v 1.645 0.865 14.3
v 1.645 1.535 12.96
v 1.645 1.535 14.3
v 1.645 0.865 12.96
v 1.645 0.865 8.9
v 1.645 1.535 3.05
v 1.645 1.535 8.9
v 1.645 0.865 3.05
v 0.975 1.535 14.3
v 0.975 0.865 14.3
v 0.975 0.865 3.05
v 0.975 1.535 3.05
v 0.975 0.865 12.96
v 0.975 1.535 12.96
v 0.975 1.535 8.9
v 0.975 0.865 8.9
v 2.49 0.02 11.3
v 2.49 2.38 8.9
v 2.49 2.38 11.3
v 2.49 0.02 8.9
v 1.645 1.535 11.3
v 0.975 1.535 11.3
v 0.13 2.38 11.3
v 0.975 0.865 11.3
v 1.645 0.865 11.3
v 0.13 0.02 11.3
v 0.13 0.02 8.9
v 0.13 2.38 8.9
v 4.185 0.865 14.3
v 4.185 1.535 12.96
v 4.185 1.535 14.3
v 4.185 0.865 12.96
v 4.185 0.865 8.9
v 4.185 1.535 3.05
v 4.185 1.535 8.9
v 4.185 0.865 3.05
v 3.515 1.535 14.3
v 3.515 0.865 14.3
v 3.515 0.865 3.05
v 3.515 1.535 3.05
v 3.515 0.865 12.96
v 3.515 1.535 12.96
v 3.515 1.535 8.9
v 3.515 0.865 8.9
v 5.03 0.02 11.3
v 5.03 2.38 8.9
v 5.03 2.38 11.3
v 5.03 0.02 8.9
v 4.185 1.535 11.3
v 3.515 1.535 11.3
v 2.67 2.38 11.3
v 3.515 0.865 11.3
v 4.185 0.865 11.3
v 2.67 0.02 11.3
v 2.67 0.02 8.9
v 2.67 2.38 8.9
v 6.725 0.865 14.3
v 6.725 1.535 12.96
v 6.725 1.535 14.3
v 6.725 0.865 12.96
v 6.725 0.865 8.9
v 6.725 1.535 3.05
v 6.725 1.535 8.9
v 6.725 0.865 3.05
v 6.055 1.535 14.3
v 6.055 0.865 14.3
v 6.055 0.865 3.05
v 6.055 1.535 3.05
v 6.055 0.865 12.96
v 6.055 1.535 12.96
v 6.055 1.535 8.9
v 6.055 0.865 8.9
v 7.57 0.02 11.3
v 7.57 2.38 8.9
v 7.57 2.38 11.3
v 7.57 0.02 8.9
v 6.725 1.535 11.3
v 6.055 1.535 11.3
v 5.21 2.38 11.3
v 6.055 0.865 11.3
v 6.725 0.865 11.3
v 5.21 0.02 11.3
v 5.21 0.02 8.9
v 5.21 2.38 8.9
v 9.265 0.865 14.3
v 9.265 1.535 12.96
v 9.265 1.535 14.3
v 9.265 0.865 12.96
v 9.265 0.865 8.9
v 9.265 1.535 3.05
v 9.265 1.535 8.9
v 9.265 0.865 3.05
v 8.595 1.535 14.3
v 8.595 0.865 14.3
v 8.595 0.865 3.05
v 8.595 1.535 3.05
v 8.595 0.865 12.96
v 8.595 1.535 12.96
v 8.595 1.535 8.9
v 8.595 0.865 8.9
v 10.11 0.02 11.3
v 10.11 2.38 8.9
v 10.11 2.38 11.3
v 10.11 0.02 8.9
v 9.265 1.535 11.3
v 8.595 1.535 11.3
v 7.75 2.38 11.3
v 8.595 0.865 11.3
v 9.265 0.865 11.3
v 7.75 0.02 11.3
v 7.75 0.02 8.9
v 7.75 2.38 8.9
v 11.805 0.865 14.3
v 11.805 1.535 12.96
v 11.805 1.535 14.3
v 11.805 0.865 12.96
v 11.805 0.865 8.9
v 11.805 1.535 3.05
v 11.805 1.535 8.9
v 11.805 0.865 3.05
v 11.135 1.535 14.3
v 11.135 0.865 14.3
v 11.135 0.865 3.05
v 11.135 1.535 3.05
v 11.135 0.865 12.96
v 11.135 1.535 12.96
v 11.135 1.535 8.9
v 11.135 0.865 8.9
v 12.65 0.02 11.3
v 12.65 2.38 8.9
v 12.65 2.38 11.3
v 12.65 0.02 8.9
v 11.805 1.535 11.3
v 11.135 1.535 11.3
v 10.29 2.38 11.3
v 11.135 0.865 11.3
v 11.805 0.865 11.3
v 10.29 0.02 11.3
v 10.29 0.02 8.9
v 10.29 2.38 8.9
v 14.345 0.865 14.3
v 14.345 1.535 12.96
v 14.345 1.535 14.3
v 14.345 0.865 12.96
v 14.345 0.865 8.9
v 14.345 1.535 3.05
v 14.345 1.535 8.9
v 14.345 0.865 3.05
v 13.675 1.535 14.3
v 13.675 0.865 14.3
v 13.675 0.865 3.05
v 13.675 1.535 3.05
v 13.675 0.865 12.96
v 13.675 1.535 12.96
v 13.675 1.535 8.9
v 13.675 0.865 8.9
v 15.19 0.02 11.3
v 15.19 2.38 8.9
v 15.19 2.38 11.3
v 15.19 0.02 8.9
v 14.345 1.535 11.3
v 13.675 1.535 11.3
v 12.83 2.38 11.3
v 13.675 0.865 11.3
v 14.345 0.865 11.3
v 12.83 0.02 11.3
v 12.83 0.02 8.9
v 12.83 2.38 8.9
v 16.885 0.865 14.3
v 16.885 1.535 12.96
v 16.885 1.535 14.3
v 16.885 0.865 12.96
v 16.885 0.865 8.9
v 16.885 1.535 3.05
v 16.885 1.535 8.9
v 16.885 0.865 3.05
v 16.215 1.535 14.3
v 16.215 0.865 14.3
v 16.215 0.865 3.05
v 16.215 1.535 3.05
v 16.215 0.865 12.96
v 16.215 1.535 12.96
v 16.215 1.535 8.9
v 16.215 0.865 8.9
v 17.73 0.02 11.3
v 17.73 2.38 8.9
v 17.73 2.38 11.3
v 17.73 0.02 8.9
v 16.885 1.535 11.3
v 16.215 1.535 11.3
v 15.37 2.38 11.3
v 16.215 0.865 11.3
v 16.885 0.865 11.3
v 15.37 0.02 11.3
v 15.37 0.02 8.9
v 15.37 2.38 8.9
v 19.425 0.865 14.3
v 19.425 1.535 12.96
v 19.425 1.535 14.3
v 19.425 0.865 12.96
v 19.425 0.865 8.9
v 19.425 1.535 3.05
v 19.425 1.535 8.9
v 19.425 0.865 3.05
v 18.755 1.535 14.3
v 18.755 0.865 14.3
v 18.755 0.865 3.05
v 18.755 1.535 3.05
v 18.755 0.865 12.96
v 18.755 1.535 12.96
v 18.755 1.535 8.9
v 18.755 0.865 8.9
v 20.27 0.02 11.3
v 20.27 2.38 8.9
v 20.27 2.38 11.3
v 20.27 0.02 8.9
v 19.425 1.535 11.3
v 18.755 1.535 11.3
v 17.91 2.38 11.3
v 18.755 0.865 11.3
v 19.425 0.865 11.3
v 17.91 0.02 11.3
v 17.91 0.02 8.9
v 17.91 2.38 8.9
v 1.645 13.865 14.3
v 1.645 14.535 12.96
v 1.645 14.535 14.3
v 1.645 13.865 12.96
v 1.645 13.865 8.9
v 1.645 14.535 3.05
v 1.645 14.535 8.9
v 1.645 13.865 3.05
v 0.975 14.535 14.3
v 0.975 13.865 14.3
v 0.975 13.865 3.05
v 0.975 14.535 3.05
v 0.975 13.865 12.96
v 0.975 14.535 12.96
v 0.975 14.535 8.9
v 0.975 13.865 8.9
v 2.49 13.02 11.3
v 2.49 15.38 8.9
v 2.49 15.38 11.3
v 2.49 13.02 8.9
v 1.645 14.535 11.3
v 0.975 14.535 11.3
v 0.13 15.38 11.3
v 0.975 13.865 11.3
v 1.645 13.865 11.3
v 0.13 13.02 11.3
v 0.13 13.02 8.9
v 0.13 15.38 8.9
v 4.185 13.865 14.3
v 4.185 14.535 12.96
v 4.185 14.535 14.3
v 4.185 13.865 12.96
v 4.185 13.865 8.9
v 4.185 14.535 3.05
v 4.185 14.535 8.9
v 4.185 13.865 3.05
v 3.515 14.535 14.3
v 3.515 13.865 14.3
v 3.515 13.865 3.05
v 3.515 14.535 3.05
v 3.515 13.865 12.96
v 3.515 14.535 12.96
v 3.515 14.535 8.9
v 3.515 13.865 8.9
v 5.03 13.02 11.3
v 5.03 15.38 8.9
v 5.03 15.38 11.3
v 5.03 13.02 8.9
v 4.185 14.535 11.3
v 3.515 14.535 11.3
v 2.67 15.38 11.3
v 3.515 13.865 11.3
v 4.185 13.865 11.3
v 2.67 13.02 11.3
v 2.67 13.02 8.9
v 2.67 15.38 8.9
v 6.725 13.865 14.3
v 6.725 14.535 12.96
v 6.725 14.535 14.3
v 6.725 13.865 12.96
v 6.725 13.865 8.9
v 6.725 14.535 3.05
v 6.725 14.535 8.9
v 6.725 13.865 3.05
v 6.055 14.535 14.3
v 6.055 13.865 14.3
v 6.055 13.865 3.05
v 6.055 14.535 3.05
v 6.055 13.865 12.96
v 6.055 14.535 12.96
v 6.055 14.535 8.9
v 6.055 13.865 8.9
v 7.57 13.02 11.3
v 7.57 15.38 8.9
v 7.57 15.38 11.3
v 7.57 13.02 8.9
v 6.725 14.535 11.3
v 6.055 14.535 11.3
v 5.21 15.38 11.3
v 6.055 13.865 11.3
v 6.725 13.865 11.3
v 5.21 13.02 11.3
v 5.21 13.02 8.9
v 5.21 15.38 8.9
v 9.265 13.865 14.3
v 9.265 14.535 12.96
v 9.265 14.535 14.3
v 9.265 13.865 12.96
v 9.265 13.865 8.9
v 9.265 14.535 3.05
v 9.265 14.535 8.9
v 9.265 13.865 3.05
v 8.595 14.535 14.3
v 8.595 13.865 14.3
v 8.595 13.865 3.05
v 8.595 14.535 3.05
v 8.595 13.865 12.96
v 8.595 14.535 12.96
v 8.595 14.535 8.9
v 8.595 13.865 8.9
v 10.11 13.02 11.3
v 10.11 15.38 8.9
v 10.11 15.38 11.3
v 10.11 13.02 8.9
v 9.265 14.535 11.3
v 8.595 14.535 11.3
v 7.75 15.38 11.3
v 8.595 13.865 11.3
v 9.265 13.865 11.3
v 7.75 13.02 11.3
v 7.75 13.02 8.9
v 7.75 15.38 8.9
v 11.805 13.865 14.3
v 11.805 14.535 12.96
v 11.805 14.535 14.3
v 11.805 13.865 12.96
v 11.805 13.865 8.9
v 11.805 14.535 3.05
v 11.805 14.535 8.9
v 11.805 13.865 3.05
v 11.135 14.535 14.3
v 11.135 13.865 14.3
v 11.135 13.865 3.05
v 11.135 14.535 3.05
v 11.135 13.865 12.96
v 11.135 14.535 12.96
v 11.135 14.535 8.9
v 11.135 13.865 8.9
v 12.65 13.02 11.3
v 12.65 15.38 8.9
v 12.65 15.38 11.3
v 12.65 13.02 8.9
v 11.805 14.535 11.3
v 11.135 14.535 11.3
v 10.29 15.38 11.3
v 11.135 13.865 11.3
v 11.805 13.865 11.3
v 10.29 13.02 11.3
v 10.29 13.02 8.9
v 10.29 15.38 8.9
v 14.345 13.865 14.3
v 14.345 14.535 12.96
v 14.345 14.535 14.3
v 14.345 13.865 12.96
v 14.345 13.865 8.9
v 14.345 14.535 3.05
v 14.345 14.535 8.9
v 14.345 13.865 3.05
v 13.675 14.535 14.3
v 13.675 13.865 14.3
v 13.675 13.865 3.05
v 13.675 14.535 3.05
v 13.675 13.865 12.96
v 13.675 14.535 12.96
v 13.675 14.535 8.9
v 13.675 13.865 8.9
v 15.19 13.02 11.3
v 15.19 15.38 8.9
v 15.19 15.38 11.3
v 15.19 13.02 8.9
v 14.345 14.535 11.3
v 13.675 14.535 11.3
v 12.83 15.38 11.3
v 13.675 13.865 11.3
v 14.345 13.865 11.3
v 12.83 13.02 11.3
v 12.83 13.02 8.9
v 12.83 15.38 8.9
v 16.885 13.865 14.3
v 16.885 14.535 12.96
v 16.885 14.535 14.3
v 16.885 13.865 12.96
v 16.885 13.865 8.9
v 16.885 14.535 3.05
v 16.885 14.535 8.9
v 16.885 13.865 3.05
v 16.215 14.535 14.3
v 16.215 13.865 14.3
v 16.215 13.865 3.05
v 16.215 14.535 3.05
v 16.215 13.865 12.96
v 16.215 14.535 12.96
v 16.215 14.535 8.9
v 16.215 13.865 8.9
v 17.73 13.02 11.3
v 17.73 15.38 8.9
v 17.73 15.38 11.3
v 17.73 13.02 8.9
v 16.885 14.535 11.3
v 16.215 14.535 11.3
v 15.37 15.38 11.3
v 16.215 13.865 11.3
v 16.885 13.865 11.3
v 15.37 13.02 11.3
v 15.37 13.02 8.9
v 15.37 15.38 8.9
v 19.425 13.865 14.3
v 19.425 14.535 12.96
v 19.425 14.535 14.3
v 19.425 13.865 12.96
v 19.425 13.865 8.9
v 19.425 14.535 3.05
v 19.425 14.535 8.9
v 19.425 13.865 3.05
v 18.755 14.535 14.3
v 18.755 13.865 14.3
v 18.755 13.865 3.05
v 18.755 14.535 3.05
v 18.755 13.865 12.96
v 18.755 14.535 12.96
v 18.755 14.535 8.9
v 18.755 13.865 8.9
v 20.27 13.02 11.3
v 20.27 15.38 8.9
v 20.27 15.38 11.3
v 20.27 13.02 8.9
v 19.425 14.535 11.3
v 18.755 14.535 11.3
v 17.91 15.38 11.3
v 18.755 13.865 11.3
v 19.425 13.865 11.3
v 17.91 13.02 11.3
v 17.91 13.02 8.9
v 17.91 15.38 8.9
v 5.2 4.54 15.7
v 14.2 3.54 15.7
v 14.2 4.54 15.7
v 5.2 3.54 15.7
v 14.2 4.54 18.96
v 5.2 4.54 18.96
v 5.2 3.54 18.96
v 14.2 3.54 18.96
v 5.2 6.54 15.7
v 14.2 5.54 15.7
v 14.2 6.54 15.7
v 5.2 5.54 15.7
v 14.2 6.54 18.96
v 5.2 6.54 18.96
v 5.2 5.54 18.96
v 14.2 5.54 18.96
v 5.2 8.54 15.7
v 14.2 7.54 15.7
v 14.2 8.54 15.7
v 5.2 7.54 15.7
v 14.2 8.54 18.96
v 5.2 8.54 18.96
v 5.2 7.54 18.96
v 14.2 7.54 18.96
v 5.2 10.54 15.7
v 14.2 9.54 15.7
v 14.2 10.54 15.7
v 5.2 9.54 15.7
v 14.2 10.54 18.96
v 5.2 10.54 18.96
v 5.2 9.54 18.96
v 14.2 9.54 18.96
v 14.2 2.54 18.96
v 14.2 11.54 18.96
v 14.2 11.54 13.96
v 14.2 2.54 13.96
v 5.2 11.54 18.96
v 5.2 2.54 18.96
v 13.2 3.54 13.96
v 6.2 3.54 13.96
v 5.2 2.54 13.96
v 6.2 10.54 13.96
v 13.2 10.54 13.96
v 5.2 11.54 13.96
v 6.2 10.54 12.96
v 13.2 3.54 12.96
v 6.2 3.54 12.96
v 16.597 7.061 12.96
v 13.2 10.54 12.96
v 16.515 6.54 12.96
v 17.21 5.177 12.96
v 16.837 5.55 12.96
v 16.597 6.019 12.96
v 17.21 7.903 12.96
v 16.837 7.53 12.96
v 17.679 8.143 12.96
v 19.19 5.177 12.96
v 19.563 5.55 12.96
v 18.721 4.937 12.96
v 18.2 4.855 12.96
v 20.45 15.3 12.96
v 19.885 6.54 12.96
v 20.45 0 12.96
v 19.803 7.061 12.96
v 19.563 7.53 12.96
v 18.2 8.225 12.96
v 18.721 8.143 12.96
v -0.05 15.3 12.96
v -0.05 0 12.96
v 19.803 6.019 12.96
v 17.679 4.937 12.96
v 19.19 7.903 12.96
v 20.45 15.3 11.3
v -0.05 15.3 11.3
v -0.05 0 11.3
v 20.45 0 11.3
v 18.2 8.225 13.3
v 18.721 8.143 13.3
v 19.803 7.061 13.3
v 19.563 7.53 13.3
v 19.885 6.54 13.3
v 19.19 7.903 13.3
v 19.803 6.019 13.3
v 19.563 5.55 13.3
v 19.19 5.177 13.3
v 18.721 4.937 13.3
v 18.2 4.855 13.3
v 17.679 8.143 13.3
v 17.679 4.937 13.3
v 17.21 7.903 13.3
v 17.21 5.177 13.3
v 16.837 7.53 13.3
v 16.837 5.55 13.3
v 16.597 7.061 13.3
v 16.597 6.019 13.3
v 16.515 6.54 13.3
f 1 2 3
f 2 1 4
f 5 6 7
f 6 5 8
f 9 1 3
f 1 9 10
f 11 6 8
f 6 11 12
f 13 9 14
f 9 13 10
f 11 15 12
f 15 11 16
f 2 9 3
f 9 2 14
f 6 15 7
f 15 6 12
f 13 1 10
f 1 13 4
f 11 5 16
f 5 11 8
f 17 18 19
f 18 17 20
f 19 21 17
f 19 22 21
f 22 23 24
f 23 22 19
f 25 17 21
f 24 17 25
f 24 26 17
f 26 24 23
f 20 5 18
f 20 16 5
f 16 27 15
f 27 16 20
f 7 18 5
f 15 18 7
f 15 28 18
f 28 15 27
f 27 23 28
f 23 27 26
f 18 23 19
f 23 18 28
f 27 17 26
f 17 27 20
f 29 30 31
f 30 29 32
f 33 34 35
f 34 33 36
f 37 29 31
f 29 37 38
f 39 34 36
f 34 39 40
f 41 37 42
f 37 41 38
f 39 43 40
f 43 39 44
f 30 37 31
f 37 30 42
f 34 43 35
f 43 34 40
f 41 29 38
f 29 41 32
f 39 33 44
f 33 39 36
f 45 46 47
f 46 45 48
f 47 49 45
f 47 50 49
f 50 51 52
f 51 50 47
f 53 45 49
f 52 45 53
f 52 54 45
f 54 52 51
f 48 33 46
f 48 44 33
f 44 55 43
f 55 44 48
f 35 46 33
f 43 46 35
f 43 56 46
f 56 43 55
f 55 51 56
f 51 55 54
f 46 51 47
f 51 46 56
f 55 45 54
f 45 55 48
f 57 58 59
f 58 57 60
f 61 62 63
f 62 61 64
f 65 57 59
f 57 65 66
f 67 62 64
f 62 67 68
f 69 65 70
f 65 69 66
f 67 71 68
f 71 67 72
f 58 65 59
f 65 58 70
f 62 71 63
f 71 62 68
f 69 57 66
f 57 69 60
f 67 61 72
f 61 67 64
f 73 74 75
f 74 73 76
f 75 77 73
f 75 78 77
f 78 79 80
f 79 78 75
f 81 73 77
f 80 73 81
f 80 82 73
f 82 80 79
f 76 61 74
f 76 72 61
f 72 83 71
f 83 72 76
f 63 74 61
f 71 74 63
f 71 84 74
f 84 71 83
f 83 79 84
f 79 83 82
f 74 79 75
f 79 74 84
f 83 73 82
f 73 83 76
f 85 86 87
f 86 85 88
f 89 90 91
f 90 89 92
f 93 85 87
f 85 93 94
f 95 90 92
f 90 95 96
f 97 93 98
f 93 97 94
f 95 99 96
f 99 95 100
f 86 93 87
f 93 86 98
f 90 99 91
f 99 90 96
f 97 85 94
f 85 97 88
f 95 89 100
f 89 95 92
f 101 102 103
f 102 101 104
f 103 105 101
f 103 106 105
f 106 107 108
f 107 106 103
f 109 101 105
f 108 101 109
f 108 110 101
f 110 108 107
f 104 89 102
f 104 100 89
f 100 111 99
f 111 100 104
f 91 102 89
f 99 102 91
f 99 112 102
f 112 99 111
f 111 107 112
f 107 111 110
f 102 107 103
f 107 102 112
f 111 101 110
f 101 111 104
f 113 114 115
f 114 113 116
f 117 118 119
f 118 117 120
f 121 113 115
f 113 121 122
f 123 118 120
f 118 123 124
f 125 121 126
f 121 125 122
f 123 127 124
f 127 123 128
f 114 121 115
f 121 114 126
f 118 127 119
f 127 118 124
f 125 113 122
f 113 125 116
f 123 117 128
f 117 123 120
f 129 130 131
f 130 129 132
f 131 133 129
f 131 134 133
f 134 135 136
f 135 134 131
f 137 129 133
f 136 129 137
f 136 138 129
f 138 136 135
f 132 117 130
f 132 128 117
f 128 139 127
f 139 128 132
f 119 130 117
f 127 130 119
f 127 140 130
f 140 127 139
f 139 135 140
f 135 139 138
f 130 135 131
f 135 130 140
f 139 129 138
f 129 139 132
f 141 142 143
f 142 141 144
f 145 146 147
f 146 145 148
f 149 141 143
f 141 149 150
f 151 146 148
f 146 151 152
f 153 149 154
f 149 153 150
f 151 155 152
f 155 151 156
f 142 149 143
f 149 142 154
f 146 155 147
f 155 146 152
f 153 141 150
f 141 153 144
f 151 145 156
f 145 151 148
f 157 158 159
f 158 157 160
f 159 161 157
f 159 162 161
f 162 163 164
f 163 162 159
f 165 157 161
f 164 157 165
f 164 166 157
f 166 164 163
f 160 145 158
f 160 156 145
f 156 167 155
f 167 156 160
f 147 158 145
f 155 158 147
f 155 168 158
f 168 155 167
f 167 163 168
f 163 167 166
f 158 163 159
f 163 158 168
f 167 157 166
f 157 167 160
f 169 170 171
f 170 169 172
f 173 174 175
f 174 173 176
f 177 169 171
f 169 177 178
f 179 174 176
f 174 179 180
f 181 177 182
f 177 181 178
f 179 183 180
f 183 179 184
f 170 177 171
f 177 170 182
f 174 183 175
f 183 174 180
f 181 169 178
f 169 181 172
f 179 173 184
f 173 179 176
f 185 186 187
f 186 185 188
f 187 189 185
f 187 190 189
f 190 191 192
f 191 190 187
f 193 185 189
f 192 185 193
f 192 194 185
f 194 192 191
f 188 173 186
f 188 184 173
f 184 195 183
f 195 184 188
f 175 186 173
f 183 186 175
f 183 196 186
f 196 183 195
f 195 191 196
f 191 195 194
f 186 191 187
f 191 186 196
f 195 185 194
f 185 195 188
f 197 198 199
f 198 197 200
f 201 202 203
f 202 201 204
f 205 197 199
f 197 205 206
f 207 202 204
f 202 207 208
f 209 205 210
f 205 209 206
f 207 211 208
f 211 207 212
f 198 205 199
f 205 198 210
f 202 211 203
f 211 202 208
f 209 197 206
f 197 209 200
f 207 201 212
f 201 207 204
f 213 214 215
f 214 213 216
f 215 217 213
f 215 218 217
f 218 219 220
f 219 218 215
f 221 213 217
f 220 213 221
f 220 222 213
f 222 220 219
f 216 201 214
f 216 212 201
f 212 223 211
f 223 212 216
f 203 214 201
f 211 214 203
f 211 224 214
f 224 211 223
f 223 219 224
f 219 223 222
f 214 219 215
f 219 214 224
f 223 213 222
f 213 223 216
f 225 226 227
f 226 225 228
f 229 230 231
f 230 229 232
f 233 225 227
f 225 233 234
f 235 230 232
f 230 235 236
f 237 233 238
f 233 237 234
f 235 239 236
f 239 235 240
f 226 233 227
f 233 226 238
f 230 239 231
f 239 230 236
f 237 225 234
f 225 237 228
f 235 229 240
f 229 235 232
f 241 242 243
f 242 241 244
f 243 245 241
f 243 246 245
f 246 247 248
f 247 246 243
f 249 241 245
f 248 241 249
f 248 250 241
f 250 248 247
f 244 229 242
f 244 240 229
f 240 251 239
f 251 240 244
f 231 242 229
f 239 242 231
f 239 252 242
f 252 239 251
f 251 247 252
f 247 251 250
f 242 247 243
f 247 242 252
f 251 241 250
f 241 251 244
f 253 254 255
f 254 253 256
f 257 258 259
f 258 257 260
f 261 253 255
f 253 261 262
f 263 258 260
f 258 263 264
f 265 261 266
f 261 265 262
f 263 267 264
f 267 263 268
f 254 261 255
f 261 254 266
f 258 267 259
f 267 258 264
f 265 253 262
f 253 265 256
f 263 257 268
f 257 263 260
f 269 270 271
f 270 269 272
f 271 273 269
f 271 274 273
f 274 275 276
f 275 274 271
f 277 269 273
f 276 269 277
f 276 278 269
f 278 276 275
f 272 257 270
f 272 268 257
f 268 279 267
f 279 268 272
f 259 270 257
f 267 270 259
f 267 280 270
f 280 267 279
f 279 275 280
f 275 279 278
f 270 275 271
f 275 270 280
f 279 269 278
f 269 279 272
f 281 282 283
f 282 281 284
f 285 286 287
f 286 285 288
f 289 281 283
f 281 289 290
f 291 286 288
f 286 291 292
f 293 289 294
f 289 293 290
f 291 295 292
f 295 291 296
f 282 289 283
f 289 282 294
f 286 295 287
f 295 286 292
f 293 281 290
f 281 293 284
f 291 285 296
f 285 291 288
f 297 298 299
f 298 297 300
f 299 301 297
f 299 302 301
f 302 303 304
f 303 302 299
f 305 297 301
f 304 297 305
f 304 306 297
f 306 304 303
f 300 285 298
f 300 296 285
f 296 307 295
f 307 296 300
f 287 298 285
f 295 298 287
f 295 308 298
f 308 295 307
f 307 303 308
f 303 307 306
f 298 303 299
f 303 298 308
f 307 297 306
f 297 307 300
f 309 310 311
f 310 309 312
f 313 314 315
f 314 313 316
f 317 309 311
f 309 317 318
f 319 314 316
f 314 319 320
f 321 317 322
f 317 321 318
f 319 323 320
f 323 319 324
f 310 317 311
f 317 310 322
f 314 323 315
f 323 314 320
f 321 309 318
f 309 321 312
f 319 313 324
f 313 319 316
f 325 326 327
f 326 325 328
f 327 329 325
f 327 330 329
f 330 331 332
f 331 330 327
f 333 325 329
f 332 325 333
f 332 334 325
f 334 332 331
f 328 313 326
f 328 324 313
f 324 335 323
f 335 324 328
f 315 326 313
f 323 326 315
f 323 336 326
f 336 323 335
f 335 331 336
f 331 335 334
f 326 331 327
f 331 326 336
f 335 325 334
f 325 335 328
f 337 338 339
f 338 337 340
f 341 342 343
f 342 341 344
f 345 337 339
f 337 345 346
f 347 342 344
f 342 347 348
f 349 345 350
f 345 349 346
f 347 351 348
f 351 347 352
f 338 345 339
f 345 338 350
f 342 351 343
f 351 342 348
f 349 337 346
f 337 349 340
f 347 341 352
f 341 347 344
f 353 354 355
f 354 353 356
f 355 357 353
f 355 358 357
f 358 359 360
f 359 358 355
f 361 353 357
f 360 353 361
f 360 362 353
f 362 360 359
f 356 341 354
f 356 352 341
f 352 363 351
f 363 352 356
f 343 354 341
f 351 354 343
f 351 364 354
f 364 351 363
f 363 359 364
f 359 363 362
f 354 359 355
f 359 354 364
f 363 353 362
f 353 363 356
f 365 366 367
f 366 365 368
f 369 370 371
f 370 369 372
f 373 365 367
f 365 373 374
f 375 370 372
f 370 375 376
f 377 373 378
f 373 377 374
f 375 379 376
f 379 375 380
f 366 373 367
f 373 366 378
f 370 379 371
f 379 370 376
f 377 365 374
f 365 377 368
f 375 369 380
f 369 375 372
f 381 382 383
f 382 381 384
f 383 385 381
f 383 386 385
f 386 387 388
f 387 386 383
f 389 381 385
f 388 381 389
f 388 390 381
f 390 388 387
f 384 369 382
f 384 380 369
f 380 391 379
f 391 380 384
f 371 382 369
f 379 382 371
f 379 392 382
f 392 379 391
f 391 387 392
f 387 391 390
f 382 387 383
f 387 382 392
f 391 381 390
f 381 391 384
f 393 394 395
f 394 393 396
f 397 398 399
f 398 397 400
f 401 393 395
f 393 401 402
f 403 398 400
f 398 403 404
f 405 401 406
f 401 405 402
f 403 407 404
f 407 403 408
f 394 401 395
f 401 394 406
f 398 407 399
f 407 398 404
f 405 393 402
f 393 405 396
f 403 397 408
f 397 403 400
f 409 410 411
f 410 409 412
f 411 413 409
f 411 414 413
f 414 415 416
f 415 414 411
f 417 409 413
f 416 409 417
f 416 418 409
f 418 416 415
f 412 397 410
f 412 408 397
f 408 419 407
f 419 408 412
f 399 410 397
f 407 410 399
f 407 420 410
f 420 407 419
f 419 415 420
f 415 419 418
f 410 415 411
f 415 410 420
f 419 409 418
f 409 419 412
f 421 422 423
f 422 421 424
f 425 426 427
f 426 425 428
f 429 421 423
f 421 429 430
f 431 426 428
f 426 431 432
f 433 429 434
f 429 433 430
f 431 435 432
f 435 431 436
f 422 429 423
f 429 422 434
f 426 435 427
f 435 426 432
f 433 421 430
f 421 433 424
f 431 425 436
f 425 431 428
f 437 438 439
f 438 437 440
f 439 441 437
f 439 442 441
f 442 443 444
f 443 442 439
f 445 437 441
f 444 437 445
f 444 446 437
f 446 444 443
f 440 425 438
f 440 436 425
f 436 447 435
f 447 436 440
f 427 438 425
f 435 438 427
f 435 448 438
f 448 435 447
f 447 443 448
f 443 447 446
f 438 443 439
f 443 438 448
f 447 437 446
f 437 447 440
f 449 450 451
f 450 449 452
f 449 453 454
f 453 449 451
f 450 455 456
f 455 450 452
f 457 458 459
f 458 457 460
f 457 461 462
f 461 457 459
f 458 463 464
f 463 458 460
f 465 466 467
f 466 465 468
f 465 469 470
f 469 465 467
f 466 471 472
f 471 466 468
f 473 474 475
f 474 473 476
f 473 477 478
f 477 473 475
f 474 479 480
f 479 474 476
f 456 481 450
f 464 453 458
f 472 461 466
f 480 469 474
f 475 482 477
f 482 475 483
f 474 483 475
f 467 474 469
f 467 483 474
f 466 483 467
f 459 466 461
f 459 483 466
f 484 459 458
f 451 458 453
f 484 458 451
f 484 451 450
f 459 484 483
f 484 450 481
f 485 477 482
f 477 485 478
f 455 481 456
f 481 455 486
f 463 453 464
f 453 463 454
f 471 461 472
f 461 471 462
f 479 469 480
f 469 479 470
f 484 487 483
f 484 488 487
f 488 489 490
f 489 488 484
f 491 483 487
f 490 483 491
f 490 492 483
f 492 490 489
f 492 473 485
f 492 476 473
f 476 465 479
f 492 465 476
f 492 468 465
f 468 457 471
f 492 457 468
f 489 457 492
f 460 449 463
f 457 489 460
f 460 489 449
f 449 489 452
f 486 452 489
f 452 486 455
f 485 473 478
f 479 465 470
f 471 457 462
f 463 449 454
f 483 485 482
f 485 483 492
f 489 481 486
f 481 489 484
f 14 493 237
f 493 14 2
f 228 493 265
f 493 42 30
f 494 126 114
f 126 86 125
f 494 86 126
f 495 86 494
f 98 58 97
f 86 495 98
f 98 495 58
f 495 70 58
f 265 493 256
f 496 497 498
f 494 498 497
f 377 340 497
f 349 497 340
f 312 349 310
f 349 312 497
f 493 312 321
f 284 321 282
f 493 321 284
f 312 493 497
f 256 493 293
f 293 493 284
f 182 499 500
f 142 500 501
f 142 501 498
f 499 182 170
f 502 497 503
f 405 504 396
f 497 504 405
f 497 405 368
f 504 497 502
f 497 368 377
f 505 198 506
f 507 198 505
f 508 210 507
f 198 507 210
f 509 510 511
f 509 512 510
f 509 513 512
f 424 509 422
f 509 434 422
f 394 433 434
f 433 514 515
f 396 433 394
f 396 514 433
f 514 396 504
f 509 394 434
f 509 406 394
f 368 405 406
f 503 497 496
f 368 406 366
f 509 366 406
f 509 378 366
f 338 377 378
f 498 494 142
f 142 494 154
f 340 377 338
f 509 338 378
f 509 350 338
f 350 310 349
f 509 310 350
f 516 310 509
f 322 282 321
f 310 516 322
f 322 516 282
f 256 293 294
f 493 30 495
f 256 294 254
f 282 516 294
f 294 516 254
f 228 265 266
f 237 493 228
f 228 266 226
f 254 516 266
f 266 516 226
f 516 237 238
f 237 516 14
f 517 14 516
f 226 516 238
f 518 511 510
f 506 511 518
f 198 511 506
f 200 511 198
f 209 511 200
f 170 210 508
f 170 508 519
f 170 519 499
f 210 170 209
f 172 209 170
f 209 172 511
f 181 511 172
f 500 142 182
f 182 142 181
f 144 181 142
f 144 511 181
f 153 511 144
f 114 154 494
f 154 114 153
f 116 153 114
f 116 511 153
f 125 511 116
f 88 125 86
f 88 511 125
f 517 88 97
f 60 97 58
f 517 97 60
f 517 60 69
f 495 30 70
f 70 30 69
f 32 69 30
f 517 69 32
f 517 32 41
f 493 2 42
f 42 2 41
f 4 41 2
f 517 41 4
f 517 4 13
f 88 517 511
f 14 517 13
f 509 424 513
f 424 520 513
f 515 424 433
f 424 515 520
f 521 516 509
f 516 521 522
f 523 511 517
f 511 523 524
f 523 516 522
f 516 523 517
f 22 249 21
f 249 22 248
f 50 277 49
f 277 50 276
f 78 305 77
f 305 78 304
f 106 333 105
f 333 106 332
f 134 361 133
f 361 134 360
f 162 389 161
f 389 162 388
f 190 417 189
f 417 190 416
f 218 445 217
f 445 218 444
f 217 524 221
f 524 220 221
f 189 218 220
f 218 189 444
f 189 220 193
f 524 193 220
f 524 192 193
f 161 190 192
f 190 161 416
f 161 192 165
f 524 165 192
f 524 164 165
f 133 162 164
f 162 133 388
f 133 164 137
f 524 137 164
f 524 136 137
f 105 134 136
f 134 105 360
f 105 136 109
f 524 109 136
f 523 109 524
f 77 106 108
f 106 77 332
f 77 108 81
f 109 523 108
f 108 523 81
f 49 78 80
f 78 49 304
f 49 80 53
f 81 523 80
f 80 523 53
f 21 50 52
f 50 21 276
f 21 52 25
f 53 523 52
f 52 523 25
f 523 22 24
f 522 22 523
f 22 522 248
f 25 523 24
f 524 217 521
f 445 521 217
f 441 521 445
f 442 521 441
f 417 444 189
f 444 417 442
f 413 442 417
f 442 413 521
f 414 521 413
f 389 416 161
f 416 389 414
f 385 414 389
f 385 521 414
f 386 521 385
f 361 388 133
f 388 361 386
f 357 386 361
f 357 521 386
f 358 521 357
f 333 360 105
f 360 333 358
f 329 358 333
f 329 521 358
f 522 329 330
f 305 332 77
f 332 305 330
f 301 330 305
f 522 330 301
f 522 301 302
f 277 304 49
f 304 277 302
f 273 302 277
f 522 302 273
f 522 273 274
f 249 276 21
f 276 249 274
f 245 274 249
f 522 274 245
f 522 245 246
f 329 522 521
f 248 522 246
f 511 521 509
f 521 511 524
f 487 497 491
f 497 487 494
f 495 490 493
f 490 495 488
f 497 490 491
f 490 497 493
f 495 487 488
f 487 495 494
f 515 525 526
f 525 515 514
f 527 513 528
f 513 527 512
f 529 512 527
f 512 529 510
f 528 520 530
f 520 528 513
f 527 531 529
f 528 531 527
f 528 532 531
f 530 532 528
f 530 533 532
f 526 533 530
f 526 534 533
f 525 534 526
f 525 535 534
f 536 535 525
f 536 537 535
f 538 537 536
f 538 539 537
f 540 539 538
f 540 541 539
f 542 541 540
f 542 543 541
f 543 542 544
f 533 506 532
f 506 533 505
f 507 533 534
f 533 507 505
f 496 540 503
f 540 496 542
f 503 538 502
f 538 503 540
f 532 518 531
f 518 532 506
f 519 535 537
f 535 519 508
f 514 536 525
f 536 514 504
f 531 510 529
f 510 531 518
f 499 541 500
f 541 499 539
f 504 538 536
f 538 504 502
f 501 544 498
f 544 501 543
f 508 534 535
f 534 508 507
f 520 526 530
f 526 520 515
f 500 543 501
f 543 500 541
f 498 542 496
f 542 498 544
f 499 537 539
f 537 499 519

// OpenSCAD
// file: ../headers/header_pins.scad
/*
  Breakaway Header Pins: pitch 2.54, adjustable
  Aaron Ciuffo
  December 23 2015
  GPL V3

  derived from Molex KK 100 break-away header:
  http://www.molex.com/pdm_docs/sd/022032041_sd.pdf

  Usage (default values shown): 
  ```
  use </path/to/libraries/header_pins.scad>
  //full
  headerPins(columns = 3, rows = 2, centerV = false, center = true, pitch = 2.52);
  //simple
  headerPins(3, 2);
  ```
  columns = integer number of columns (X axis)
  rows = integer number of rows (Y axis)
  centerV = vertically center around base - fale places bottom at origin
  center = center the array at the origin
  pitch = distance between center of each pin

  Note: 
  * the breakaway connector is a bit of a fudge and does not appear at the same
    Z height for centered/versus non centered; this should be largely irrelevant 

  updates can be found at GitHub:
  https://github.com/txoof/OpenSCAD_electronics

*/

/*[Dimensions]*/
//Columns
columns = 3; //[1:30]
//Rows
rows = 2; //[1:5]
//Pitch
pitch = 2.54; //[1.25, 1.27, 2, 2.54, 3.5, 3.96]

pinHeight=11.25;

pinAboveNylon=3;

module singlePin(center = false, locate = false, v = false, pinHeight=14.22, pinAboveNylon = 7.49) {
  pinDimensions = [.67, .67, pinHeight];
  nylonDimensions = [2.36, 2.36, 2.4];

  trans = center == false ? [0, 0, nylonDimensions[2]/2] : [0, 0, 0];

  translate(trans)
  union() {
    translate([0, 0, (-pinDimensions[2]/2+nylonDimensions[2]/2)+pinAboveNylon])
      color("gold")
      cube(pinDimensions, center = true);    
    color("darkgray")
      cube(nylonDimensions, center =true);
    if (locate) {
      color("red")
        cylinder(r = 0.1, h = pinDimensions[2]*5, center = true);
    }
  }

  if (v) {
    echo("single pin dimension:", pinDimensions);
    echo("pin above nylon:", pinAboveNylon);
  }

}

module headerPins(columns = 3, rows = 2, centerV = false, center = true, 
                  pitch = 2.54, locate = false, v = false, pinHeight=14.22, pinAboveNylon=7.49) {
  transV = centerV == false ? pitch/2 : 0; // vertical center

  trans = center == false ? [0, 0, 0] : [-(columns-1)*pitch/2, -(rows-1)*pitch/2, 0];
  if (v) {
    echo("header pin array");
    echo("usage: columns, rows, centerV, center, pitch, locate, v(erbose)");
  }

  translate(trans) 
  union() {
    for (i = [0:columns-1]) {
      for (j = [0:rows-1]) {
        translate([pitch*i, pitch*j, 0])
          singlePin(locate = locate, v = v, pinHeight=pinHeight, pinAboveNylon=pinAboveNylon);
      }
    }
    translate([0, 0, -pitch/2+transV])
      color("black")
      cube([pitch*(columns-1), pitch*(rows-1), 2]);
  }
}

//singlePin();
headerPins(columns = columns , rows = rows, pitch = pitch, pinHeight = pinHeight, pinAboveNylon=pinAboveNylon);
// main file
/* Pololu stepper driver board
  Neeraj Verma
  July 23 2018
  GPL V3
  
  use </path/to/libraries/step_stick.scad>
  //full
  step_stick(sinkHeight=5);
  //simple
  step_stick();
*/

use <../headers/header_pins.scad>

sinkHeight=5;
heightAbovePCBSurface = 8.9;

module board(sinkHeight=5) {
// pcb
translate([15.25,0,-1]) rotate(90) color("red") cube([15.3,20.5,1.66]);   
// chip
translate([1,3.54,0.66]) cube([7,7,1]);    
// heat sink    
color("silver") difference() {
    translate([0,2.54,1.66]) cube([9,9,sinkHeight]);
    union() {
        translate([-.1,3.54,3.4]) cube([10,1,sinkHeight+1]);
        translate([-.1,5.54,3.4]) cube([10,1,sinkHeight+1]);
        translate([-.1,7.54,3.4]) cube([10,1,sinkHeight+1]);
        translate([-.1,9.54,3.4]) cube([10,1,sinkHeight+1]);
    }    
}    
// pot
translate([13,6.54,0.5]) color("silver") cylinder(h=0.5,d=3.37, $fn=20);   
} 

module step_stick(sinkHeight=5, heightAbovePCBSurface=8.9) {
    translate([10.2,1.2,heightAbovePCBSurface]) union() {
        headerPins(8, 1, pinAboveNylon=3, pinHeight=11.25);
        translate ([0,13,0]) headerPins(8, 1, pinAboveNylon=3, pinHeight=11.25);
        translate([-5,-1.2, 3.4]) board(sinkHeight=sinkHeight);
    }
}

step_stick(sinkHeight=sinkHeight, heightAbovePCBSurface=heightAbovePCBSurface);
